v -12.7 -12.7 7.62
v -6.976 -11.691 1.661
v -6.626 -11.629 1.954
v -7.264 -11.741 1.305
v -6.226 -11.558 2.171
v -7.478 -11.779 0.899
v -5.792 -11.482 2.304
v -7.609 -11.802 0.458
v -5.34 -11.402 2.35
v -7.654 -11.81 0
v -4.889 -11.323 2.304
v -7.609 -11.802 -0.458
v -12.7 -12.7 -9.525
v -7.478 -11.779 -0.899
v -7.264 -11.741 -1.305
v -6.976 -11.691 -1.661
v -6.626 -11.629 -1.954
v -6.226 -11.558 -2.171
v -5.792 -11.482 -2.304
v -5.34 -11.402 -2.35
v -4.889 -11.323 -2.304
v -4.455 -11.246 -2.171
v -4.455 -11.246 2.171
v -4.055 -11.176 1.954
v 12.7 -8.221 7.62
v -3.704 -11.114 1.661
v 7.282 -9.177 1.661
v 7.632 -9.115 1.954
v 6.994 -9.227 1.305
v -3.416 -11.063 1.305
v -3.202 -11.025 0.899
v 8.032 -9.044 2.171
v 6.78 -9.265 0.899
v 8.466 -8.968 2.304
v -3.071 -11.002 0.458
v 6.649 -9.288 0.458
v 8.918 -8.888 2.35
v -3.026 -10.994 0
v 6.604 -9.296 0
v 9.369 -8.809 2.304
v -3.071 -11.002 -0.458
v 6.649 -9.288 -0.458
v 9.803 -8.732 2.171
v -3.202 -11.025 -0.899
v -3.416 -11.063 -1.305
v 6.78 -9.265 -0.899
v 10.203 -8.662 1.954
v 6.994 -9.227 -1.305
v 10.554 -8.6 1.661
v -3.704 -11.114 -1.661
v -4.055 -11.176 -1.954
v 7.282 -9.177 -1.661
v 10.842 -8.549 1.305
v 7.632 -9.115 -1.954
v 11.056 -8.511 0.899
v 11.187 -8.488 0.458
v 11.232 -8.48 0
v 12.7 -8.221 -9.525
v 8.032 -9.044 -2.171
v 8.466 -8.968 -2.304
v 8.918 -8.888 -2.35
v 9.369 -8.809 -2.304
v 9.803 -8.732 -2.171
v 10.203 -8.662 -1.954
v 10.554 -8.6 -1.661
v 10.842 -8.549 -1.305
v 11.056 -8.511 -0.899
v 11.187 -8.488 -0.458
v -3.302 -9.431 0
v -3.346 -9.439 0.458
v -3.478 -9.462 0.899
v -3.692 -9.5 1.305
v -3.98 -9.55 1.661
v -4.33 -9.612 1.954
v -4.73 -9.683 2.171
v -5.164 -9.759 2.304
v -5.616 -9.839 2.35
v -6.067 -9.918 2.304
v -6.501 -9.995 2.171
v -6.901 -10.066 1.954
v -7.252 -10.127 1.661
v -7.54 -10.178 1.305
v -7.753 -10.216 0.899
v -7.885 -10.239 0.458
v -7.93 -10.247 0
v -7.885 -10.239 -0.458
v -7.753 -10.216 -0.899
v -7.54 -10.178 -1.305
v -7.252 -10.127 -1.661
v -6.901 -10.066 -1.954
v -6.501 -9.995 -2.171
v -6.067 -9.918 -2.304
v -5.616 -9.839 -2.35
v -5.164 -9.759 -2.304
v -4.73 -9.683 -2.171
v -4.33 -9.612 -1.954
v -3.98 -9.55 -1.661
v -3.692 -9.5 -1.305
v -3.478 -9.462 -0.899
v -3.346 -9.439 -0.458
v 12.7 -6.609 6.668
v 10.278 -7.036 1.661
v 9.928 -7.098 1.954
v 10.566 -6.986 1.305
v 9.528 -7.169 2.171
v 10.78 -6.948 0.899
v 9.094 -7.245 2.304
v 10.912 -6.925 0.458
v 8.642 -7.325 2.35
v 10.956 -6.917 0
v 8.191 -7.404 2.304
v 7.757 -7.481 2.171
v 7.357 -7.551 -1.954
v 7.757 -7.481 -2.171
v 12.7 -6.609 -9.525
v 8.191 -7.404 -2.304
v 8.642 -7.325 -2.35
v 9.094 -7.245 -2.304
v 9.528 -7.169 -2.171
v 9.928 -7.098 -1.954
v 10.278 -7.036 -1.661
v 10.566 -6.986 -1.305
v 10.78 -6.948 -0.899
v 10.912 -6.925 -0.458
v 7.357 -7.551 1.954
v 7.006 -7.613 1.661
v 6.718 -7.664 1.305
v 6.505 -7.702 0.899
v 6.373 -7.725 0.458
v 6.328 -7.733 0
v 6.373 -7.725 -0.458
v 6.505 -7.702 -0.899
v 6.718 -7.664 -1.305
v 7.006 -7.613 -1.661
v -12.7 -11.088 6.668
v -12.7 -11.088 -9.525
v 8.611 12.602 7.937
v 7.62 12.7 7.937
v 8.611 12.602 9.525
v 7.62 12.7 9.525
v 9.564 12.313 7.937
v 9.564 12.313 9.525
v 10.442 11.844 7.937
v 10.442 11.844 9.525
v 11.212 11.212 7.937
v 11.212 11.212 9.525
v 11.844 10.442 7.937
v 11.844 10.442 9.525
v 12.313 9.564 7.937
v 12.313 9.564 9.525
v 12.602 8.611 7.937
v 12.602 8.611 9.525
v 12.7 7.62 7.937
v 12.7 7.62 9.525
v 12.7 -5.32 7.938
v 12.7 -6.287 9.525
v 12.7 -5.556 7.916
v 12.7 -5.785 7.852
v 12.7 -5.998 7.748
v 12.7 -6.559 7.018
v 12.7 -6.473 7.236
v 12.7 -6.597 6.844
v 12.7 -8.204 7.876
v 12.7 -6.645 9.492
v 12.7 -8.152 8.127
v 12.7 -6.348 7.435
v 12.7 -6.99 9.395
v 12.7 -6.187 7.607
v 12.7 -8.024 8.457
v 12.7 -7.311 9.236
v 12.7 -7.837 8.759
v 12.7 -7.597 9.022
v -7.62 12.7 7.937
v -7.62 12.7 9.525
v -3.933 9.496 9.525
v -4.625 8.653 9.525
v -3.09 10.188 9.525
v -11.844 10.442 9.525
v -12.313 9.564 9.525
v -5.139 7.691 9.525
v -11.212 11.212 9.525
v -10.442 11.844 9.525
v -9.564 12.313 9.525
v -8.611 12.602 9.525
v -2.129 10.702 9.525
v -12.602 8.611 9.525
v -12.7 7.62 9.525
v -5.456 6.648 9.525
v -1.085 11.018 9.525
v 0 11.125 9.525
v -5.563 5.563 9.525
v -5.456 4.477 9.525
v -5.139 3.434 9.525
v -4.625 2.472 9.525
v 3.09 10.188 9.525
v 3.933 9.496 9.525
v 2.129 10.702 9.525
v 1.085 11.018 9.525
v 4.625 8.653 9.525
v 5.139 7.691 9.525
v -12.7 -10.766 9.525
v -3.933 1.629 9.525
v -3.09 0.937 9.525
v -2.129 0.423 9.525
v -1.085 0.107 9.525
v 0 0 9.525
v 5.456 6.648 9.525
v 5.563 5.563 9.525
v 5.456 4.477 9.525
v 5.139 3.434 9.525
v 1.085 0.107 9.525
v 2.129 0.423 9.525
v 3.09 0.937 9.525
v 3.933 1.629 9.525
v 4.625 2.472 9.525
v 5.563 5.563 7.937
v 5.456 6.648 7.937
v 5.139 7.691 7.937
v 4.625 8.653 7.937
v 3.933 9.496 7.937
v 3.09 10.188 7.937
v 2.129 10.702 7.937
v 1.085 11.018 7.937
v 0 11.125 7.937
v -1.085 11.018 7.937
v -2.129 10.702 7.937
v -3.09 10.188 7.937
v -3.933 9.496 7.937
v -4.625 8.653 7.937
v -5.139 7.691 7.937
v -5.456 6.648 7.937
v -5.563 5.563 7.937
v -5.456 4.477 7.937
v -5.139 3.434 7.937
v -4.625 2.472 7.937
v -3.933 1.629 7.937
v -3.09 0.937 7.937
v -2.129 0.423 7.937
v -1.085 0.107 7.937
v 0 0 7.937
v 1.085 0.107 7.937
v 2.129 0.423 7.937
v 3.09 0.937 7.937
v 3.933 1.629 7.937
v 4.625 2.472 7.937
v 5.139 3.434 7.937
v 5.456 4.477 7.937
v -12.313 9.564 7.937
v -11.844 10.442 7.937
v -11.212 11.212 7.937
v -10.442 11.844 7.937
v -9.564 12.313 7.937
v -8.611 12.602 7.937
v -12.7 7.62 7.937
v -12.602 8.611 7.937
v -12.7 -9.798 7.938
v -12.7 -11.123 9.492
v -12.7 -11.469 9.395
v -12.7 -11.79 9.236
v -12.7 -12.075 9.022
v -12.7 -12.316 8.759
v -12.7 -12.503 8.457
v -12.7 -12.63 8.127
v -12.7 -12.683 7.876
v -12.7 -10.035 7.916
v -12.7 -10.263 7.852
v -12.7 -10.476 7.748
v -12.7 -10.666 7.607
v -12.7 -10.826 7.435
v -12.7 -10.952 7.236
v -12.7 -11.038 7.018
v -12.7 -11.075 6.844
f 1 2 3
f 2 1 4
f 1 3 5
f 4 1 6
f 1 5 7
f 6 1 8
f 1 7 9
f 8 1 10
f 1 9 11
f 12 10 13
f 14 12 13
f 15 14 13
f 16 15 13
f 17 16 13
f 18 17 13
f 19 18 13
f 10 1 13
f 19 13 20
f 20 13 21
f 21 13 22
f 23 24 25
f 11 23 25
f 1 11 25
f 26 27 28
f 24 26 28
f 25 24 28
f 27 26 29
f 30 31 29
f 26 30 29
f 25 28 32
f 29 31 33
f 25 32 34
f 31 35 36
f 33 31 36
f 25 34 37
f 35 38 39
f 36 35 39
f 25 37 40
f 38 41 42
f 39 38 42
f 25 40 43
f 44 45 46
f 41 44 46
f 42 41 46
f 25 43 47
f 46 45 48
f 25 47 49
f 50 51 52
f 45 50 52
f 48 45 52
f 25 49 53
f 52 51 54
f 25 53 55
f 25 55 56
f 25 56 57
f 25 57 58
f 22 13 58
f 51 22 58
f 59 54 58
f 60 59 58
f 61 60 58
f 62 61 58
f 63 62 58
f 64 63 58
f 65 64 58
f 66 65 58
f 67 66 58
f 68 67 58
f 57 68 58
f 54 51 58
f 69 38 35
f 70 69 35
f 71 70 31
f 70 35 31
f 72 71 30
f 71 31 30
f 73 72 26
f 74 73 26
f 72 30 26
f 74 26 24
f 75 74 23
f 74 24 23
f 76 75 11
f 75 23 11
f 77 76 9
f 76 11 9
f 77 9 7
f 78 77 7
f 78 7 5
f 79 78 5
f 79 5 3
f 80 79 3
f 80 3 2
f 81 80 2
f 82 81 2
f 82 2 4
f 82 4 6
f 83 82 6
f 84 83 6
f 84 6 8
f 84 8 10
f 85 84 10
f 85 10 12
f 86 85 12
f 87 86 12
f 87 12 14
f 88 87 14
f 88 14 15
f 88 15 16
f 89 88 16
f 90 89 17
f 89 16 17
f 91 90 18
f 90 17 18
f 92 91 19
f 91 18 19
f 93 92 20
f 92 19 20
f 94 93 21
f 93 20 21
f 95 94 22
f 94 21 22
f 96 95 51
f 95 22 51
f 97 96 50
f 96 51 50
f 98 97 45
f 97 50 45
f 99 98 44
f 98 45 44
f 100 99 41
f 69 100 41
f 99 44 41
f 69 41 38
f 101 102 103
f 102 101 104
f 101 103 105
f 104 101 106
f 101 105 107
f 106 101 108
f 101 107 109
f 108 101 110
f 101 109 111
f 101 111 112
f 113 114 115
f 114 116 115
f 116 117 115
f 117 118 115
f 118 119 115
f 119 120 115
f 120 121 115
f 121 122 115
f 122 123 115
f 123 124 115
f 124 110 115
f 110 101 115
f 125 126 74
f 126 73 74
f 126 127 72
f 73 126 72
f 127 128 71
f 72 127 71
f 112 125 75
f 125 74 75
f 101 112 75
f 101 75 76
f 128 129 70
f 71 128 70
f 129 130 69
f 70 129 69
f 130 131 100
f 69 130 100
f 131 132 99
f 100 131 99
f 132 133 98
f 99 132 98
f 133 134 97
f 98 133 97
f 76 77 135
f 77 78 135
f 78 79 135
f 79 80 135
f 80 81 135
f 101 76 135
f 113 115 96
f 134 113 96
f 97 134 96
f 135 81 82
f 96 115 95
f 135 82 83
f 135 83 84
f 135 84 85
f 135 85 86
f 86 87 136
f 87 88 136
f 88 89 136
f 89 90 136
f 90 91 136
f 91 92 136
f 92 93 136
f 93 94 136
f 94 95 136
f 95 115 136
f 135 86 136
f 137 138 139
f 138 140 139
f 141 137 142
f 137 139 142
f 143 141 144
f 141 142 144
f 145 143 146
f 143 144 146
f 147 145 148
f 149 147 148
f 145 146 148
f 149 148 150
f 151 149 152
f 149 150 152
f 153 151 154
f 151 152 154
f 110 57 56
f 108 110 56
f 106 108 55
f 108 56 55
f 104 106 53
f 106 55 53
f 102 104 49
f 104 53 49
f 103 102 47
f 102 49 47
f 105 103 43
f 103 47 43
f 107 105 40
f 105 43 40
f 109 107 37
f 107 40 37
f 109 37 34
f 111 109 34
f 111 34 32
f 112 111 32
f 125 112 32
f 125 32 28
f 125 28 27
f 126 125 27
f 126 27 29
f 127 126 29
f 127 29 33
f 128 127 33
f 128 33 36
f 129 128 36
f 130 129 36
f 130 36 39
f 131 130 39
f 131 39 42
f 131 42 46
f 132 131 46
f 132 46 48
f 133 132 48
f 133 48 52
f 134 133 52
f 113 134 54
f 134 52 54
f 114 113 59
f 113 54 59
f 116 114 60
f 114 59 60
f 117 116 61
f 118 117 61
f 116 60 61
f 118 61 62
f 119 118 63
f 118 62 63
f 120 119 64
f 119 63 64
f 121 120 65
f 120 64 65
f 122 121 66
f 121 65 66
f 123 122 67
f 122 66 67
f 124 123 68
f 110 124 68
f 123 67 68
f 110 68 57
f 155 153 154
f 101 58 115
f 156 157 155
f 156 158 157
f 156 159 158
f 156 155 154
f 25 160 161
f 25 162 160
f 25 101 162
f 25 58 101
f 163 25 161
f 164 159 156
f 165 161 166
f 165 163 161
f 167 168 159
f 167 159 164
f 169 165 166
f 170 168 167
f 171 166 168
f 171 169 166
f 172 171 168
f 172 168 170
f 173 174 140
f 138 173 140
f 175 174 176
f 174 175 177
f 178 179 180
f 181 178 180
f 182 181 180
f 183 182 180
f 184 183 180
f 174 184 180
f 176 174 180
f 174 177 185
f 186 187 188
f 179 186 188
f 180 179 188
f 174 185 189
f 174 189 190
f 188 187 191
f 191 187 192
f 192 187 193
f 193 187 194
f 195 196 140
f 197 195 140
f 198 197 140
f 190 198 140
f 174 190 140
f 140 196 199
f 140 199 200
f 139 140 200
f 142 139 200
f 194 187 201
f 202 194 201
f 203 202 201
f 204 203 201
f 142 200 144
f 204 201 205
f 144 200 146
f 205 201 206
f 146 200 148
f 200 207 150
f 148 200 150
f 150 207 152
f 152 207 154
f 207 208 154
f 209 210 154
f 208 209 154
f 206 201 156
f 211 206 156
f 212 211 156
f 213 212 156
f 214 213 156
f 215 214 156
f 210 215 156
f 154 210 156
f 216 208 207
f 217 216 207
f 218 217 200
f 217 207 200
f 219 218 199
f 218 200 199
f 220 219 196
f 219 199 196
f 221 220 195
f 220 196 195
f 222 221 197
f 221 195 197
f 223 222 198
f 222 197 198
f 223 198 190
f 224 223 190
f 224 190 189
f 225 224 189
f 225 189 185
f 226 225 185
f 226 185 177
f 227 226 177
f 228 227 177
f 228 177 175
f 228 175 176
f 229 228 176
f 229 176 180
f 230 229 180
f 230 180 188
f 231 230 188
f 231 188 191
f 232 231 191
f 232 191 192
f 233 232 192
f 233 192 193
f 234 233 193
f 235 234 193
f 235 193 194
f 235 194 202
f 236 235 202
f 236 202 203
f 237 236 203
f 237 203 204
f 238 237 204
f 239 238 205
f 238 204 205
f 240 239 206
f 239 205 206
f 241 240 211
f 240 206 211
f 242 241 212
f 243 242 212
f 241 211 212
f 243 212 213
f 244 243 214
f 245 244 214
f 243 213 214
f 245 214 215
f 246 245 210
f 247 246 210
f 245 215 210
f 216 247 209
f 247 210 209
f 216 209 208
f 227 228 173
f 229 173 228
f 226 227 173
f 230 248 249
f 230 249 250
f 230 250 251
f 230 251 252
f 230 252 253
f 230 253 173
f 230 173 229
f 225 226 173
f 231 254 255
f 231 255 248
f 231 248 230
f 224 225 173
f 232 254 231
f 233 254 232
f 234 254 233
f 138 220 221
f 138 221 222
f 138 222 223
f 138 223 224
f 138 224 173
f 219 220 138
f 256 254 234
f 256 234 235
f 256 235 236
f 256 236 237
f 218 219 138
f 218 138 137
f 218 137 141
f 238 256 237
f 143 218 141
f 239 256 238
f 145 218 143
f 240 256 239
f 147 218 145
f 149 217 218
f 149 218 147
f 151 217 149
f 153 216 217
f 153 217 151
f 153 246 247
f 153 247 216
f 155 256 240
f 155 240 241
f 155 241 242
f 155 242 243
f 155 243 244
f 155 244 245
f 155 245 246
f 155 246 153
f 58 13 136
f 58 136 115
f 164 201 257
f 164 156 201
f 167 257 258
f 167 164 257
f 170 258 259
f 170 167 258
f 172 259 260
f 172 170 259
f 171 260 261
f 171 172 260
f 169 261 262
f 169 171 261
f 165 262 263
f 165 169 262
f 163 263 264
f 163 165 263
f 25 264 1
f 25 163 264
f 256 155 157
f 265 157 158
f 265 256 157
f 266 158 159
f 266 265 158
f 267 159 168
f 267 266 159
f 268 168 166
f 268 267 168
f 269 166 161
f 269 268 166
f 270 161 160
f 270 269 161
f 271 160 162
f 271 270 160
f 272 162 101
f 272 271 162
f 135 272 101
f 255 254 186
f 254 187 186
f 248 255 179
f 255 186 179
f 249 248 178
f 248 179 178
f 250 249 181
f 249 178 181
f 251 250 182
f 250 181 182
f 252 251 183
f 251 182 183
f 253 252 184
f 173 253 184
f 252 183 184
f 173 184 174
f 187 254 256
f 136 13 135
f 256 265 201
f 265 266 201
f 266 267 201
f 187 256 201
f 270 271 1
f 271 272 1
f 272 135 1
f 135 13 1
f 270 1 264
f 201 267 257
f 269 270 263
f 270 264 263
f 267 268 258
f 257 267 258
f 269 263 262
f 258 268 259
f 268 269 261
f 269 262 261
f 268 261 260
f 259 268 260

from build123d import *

# Parameters (mm, degrees)
F0_W      = 25.4
F0_H      = 19.05
F1_DEPTH  = 12.7
F3_DEPTH  = 19.051
F4_DEPTH  = 17.4625
F5_R      = 1.27
F6_R      = 1.905
F7_R      = 2.3495
F8_DEPTH  = 25.0151169265
F10_R     = 5.08
F9_R      = 5.5626
F11_DEPTH = 19.051


with BuildPart() as f1:
    # F0 (on Front) → F1 (new body, symmetric)
    with BuildSketch(Plane.XZ):
        Rectangle(F0_W, F0_H)
    extrude(amount=F1_DEPTH, both=True)

    # F2 (on face) → F3 (cut, through all)
    with BuildSketch(Plane(origin=(0, 0, -9.525), x_dir=(1, 0, 0), z_dir=(0, 0, -1))):
        Polygon((12.7, 12.7), (-12.7, 12.7), (12.7, 8.22129469), align=None)
    extrude(amount=-F3_DEPTH, mode=Mode.SUBTRACT)

    # F2 (on face) → F4 (cut)
    with BuildSketch(Plane(origin=(0, 0, -9.525), x_dir=(1, 0, 0), z_dir=(0, 0, -1))):
        Polygon((12.7, 6.6093049436), (-12.7, 11.0880102536), (-12.7, -12.7), (12.7, -12.7), align=None)
    extrude(amount=-F4_DEPTH, mode=Mode.SUBTRACT)

    # F5
    f5_edges = [f1.edges().sort_by_distance(p)[0] for p in [
        (0, -8.848658, 7.9375),
    ]]
    fillet(f5_edges, radius=F5_R)

    # F6
    f6_edges = [f1.edges().sort_by_distance(p)[0] for p in [
        (0, -10.460647, 9.525),
    ]]
    fillet(f6_edges, radius=F6_R)

    # F7 (on face) → F8 (cut, through all)
    with BuildSketch(Plane(origin=(1.7888760521, -10.1452202319, 0), x_dir=(0.984807753, 0.1736481777, 0), z_dir=(0.1736481777, -0.984807753, 0))):
        with Locations((7.239, 0)):
            Circle(F7_R)
        with Locations((-7.239, 0)):
            Circle(F7_R)
    extrude(amount=-F8_DEPTH, mode=Mode.SUBTRACT)

    # F10
    f10_edges = [f1.edges().sort_by_distance(p)[0] for p in [
        (12.7, 12.7, 8.73125),
        (-12.7, 12.7, 8.73125),
    ]]
    fillet(f10_edges, radius=F10_R)

    # F9 (on face) → F11 (cut, through all)
    with BuildSketch(Plane.XY.offset(9.525)):
        with Locations((0, 5.5626)):
            Circle(F9_R)
    extrude(amount=-F11_DEPTH, mode=Mode.SUBTRACT)


solid = f1.part
